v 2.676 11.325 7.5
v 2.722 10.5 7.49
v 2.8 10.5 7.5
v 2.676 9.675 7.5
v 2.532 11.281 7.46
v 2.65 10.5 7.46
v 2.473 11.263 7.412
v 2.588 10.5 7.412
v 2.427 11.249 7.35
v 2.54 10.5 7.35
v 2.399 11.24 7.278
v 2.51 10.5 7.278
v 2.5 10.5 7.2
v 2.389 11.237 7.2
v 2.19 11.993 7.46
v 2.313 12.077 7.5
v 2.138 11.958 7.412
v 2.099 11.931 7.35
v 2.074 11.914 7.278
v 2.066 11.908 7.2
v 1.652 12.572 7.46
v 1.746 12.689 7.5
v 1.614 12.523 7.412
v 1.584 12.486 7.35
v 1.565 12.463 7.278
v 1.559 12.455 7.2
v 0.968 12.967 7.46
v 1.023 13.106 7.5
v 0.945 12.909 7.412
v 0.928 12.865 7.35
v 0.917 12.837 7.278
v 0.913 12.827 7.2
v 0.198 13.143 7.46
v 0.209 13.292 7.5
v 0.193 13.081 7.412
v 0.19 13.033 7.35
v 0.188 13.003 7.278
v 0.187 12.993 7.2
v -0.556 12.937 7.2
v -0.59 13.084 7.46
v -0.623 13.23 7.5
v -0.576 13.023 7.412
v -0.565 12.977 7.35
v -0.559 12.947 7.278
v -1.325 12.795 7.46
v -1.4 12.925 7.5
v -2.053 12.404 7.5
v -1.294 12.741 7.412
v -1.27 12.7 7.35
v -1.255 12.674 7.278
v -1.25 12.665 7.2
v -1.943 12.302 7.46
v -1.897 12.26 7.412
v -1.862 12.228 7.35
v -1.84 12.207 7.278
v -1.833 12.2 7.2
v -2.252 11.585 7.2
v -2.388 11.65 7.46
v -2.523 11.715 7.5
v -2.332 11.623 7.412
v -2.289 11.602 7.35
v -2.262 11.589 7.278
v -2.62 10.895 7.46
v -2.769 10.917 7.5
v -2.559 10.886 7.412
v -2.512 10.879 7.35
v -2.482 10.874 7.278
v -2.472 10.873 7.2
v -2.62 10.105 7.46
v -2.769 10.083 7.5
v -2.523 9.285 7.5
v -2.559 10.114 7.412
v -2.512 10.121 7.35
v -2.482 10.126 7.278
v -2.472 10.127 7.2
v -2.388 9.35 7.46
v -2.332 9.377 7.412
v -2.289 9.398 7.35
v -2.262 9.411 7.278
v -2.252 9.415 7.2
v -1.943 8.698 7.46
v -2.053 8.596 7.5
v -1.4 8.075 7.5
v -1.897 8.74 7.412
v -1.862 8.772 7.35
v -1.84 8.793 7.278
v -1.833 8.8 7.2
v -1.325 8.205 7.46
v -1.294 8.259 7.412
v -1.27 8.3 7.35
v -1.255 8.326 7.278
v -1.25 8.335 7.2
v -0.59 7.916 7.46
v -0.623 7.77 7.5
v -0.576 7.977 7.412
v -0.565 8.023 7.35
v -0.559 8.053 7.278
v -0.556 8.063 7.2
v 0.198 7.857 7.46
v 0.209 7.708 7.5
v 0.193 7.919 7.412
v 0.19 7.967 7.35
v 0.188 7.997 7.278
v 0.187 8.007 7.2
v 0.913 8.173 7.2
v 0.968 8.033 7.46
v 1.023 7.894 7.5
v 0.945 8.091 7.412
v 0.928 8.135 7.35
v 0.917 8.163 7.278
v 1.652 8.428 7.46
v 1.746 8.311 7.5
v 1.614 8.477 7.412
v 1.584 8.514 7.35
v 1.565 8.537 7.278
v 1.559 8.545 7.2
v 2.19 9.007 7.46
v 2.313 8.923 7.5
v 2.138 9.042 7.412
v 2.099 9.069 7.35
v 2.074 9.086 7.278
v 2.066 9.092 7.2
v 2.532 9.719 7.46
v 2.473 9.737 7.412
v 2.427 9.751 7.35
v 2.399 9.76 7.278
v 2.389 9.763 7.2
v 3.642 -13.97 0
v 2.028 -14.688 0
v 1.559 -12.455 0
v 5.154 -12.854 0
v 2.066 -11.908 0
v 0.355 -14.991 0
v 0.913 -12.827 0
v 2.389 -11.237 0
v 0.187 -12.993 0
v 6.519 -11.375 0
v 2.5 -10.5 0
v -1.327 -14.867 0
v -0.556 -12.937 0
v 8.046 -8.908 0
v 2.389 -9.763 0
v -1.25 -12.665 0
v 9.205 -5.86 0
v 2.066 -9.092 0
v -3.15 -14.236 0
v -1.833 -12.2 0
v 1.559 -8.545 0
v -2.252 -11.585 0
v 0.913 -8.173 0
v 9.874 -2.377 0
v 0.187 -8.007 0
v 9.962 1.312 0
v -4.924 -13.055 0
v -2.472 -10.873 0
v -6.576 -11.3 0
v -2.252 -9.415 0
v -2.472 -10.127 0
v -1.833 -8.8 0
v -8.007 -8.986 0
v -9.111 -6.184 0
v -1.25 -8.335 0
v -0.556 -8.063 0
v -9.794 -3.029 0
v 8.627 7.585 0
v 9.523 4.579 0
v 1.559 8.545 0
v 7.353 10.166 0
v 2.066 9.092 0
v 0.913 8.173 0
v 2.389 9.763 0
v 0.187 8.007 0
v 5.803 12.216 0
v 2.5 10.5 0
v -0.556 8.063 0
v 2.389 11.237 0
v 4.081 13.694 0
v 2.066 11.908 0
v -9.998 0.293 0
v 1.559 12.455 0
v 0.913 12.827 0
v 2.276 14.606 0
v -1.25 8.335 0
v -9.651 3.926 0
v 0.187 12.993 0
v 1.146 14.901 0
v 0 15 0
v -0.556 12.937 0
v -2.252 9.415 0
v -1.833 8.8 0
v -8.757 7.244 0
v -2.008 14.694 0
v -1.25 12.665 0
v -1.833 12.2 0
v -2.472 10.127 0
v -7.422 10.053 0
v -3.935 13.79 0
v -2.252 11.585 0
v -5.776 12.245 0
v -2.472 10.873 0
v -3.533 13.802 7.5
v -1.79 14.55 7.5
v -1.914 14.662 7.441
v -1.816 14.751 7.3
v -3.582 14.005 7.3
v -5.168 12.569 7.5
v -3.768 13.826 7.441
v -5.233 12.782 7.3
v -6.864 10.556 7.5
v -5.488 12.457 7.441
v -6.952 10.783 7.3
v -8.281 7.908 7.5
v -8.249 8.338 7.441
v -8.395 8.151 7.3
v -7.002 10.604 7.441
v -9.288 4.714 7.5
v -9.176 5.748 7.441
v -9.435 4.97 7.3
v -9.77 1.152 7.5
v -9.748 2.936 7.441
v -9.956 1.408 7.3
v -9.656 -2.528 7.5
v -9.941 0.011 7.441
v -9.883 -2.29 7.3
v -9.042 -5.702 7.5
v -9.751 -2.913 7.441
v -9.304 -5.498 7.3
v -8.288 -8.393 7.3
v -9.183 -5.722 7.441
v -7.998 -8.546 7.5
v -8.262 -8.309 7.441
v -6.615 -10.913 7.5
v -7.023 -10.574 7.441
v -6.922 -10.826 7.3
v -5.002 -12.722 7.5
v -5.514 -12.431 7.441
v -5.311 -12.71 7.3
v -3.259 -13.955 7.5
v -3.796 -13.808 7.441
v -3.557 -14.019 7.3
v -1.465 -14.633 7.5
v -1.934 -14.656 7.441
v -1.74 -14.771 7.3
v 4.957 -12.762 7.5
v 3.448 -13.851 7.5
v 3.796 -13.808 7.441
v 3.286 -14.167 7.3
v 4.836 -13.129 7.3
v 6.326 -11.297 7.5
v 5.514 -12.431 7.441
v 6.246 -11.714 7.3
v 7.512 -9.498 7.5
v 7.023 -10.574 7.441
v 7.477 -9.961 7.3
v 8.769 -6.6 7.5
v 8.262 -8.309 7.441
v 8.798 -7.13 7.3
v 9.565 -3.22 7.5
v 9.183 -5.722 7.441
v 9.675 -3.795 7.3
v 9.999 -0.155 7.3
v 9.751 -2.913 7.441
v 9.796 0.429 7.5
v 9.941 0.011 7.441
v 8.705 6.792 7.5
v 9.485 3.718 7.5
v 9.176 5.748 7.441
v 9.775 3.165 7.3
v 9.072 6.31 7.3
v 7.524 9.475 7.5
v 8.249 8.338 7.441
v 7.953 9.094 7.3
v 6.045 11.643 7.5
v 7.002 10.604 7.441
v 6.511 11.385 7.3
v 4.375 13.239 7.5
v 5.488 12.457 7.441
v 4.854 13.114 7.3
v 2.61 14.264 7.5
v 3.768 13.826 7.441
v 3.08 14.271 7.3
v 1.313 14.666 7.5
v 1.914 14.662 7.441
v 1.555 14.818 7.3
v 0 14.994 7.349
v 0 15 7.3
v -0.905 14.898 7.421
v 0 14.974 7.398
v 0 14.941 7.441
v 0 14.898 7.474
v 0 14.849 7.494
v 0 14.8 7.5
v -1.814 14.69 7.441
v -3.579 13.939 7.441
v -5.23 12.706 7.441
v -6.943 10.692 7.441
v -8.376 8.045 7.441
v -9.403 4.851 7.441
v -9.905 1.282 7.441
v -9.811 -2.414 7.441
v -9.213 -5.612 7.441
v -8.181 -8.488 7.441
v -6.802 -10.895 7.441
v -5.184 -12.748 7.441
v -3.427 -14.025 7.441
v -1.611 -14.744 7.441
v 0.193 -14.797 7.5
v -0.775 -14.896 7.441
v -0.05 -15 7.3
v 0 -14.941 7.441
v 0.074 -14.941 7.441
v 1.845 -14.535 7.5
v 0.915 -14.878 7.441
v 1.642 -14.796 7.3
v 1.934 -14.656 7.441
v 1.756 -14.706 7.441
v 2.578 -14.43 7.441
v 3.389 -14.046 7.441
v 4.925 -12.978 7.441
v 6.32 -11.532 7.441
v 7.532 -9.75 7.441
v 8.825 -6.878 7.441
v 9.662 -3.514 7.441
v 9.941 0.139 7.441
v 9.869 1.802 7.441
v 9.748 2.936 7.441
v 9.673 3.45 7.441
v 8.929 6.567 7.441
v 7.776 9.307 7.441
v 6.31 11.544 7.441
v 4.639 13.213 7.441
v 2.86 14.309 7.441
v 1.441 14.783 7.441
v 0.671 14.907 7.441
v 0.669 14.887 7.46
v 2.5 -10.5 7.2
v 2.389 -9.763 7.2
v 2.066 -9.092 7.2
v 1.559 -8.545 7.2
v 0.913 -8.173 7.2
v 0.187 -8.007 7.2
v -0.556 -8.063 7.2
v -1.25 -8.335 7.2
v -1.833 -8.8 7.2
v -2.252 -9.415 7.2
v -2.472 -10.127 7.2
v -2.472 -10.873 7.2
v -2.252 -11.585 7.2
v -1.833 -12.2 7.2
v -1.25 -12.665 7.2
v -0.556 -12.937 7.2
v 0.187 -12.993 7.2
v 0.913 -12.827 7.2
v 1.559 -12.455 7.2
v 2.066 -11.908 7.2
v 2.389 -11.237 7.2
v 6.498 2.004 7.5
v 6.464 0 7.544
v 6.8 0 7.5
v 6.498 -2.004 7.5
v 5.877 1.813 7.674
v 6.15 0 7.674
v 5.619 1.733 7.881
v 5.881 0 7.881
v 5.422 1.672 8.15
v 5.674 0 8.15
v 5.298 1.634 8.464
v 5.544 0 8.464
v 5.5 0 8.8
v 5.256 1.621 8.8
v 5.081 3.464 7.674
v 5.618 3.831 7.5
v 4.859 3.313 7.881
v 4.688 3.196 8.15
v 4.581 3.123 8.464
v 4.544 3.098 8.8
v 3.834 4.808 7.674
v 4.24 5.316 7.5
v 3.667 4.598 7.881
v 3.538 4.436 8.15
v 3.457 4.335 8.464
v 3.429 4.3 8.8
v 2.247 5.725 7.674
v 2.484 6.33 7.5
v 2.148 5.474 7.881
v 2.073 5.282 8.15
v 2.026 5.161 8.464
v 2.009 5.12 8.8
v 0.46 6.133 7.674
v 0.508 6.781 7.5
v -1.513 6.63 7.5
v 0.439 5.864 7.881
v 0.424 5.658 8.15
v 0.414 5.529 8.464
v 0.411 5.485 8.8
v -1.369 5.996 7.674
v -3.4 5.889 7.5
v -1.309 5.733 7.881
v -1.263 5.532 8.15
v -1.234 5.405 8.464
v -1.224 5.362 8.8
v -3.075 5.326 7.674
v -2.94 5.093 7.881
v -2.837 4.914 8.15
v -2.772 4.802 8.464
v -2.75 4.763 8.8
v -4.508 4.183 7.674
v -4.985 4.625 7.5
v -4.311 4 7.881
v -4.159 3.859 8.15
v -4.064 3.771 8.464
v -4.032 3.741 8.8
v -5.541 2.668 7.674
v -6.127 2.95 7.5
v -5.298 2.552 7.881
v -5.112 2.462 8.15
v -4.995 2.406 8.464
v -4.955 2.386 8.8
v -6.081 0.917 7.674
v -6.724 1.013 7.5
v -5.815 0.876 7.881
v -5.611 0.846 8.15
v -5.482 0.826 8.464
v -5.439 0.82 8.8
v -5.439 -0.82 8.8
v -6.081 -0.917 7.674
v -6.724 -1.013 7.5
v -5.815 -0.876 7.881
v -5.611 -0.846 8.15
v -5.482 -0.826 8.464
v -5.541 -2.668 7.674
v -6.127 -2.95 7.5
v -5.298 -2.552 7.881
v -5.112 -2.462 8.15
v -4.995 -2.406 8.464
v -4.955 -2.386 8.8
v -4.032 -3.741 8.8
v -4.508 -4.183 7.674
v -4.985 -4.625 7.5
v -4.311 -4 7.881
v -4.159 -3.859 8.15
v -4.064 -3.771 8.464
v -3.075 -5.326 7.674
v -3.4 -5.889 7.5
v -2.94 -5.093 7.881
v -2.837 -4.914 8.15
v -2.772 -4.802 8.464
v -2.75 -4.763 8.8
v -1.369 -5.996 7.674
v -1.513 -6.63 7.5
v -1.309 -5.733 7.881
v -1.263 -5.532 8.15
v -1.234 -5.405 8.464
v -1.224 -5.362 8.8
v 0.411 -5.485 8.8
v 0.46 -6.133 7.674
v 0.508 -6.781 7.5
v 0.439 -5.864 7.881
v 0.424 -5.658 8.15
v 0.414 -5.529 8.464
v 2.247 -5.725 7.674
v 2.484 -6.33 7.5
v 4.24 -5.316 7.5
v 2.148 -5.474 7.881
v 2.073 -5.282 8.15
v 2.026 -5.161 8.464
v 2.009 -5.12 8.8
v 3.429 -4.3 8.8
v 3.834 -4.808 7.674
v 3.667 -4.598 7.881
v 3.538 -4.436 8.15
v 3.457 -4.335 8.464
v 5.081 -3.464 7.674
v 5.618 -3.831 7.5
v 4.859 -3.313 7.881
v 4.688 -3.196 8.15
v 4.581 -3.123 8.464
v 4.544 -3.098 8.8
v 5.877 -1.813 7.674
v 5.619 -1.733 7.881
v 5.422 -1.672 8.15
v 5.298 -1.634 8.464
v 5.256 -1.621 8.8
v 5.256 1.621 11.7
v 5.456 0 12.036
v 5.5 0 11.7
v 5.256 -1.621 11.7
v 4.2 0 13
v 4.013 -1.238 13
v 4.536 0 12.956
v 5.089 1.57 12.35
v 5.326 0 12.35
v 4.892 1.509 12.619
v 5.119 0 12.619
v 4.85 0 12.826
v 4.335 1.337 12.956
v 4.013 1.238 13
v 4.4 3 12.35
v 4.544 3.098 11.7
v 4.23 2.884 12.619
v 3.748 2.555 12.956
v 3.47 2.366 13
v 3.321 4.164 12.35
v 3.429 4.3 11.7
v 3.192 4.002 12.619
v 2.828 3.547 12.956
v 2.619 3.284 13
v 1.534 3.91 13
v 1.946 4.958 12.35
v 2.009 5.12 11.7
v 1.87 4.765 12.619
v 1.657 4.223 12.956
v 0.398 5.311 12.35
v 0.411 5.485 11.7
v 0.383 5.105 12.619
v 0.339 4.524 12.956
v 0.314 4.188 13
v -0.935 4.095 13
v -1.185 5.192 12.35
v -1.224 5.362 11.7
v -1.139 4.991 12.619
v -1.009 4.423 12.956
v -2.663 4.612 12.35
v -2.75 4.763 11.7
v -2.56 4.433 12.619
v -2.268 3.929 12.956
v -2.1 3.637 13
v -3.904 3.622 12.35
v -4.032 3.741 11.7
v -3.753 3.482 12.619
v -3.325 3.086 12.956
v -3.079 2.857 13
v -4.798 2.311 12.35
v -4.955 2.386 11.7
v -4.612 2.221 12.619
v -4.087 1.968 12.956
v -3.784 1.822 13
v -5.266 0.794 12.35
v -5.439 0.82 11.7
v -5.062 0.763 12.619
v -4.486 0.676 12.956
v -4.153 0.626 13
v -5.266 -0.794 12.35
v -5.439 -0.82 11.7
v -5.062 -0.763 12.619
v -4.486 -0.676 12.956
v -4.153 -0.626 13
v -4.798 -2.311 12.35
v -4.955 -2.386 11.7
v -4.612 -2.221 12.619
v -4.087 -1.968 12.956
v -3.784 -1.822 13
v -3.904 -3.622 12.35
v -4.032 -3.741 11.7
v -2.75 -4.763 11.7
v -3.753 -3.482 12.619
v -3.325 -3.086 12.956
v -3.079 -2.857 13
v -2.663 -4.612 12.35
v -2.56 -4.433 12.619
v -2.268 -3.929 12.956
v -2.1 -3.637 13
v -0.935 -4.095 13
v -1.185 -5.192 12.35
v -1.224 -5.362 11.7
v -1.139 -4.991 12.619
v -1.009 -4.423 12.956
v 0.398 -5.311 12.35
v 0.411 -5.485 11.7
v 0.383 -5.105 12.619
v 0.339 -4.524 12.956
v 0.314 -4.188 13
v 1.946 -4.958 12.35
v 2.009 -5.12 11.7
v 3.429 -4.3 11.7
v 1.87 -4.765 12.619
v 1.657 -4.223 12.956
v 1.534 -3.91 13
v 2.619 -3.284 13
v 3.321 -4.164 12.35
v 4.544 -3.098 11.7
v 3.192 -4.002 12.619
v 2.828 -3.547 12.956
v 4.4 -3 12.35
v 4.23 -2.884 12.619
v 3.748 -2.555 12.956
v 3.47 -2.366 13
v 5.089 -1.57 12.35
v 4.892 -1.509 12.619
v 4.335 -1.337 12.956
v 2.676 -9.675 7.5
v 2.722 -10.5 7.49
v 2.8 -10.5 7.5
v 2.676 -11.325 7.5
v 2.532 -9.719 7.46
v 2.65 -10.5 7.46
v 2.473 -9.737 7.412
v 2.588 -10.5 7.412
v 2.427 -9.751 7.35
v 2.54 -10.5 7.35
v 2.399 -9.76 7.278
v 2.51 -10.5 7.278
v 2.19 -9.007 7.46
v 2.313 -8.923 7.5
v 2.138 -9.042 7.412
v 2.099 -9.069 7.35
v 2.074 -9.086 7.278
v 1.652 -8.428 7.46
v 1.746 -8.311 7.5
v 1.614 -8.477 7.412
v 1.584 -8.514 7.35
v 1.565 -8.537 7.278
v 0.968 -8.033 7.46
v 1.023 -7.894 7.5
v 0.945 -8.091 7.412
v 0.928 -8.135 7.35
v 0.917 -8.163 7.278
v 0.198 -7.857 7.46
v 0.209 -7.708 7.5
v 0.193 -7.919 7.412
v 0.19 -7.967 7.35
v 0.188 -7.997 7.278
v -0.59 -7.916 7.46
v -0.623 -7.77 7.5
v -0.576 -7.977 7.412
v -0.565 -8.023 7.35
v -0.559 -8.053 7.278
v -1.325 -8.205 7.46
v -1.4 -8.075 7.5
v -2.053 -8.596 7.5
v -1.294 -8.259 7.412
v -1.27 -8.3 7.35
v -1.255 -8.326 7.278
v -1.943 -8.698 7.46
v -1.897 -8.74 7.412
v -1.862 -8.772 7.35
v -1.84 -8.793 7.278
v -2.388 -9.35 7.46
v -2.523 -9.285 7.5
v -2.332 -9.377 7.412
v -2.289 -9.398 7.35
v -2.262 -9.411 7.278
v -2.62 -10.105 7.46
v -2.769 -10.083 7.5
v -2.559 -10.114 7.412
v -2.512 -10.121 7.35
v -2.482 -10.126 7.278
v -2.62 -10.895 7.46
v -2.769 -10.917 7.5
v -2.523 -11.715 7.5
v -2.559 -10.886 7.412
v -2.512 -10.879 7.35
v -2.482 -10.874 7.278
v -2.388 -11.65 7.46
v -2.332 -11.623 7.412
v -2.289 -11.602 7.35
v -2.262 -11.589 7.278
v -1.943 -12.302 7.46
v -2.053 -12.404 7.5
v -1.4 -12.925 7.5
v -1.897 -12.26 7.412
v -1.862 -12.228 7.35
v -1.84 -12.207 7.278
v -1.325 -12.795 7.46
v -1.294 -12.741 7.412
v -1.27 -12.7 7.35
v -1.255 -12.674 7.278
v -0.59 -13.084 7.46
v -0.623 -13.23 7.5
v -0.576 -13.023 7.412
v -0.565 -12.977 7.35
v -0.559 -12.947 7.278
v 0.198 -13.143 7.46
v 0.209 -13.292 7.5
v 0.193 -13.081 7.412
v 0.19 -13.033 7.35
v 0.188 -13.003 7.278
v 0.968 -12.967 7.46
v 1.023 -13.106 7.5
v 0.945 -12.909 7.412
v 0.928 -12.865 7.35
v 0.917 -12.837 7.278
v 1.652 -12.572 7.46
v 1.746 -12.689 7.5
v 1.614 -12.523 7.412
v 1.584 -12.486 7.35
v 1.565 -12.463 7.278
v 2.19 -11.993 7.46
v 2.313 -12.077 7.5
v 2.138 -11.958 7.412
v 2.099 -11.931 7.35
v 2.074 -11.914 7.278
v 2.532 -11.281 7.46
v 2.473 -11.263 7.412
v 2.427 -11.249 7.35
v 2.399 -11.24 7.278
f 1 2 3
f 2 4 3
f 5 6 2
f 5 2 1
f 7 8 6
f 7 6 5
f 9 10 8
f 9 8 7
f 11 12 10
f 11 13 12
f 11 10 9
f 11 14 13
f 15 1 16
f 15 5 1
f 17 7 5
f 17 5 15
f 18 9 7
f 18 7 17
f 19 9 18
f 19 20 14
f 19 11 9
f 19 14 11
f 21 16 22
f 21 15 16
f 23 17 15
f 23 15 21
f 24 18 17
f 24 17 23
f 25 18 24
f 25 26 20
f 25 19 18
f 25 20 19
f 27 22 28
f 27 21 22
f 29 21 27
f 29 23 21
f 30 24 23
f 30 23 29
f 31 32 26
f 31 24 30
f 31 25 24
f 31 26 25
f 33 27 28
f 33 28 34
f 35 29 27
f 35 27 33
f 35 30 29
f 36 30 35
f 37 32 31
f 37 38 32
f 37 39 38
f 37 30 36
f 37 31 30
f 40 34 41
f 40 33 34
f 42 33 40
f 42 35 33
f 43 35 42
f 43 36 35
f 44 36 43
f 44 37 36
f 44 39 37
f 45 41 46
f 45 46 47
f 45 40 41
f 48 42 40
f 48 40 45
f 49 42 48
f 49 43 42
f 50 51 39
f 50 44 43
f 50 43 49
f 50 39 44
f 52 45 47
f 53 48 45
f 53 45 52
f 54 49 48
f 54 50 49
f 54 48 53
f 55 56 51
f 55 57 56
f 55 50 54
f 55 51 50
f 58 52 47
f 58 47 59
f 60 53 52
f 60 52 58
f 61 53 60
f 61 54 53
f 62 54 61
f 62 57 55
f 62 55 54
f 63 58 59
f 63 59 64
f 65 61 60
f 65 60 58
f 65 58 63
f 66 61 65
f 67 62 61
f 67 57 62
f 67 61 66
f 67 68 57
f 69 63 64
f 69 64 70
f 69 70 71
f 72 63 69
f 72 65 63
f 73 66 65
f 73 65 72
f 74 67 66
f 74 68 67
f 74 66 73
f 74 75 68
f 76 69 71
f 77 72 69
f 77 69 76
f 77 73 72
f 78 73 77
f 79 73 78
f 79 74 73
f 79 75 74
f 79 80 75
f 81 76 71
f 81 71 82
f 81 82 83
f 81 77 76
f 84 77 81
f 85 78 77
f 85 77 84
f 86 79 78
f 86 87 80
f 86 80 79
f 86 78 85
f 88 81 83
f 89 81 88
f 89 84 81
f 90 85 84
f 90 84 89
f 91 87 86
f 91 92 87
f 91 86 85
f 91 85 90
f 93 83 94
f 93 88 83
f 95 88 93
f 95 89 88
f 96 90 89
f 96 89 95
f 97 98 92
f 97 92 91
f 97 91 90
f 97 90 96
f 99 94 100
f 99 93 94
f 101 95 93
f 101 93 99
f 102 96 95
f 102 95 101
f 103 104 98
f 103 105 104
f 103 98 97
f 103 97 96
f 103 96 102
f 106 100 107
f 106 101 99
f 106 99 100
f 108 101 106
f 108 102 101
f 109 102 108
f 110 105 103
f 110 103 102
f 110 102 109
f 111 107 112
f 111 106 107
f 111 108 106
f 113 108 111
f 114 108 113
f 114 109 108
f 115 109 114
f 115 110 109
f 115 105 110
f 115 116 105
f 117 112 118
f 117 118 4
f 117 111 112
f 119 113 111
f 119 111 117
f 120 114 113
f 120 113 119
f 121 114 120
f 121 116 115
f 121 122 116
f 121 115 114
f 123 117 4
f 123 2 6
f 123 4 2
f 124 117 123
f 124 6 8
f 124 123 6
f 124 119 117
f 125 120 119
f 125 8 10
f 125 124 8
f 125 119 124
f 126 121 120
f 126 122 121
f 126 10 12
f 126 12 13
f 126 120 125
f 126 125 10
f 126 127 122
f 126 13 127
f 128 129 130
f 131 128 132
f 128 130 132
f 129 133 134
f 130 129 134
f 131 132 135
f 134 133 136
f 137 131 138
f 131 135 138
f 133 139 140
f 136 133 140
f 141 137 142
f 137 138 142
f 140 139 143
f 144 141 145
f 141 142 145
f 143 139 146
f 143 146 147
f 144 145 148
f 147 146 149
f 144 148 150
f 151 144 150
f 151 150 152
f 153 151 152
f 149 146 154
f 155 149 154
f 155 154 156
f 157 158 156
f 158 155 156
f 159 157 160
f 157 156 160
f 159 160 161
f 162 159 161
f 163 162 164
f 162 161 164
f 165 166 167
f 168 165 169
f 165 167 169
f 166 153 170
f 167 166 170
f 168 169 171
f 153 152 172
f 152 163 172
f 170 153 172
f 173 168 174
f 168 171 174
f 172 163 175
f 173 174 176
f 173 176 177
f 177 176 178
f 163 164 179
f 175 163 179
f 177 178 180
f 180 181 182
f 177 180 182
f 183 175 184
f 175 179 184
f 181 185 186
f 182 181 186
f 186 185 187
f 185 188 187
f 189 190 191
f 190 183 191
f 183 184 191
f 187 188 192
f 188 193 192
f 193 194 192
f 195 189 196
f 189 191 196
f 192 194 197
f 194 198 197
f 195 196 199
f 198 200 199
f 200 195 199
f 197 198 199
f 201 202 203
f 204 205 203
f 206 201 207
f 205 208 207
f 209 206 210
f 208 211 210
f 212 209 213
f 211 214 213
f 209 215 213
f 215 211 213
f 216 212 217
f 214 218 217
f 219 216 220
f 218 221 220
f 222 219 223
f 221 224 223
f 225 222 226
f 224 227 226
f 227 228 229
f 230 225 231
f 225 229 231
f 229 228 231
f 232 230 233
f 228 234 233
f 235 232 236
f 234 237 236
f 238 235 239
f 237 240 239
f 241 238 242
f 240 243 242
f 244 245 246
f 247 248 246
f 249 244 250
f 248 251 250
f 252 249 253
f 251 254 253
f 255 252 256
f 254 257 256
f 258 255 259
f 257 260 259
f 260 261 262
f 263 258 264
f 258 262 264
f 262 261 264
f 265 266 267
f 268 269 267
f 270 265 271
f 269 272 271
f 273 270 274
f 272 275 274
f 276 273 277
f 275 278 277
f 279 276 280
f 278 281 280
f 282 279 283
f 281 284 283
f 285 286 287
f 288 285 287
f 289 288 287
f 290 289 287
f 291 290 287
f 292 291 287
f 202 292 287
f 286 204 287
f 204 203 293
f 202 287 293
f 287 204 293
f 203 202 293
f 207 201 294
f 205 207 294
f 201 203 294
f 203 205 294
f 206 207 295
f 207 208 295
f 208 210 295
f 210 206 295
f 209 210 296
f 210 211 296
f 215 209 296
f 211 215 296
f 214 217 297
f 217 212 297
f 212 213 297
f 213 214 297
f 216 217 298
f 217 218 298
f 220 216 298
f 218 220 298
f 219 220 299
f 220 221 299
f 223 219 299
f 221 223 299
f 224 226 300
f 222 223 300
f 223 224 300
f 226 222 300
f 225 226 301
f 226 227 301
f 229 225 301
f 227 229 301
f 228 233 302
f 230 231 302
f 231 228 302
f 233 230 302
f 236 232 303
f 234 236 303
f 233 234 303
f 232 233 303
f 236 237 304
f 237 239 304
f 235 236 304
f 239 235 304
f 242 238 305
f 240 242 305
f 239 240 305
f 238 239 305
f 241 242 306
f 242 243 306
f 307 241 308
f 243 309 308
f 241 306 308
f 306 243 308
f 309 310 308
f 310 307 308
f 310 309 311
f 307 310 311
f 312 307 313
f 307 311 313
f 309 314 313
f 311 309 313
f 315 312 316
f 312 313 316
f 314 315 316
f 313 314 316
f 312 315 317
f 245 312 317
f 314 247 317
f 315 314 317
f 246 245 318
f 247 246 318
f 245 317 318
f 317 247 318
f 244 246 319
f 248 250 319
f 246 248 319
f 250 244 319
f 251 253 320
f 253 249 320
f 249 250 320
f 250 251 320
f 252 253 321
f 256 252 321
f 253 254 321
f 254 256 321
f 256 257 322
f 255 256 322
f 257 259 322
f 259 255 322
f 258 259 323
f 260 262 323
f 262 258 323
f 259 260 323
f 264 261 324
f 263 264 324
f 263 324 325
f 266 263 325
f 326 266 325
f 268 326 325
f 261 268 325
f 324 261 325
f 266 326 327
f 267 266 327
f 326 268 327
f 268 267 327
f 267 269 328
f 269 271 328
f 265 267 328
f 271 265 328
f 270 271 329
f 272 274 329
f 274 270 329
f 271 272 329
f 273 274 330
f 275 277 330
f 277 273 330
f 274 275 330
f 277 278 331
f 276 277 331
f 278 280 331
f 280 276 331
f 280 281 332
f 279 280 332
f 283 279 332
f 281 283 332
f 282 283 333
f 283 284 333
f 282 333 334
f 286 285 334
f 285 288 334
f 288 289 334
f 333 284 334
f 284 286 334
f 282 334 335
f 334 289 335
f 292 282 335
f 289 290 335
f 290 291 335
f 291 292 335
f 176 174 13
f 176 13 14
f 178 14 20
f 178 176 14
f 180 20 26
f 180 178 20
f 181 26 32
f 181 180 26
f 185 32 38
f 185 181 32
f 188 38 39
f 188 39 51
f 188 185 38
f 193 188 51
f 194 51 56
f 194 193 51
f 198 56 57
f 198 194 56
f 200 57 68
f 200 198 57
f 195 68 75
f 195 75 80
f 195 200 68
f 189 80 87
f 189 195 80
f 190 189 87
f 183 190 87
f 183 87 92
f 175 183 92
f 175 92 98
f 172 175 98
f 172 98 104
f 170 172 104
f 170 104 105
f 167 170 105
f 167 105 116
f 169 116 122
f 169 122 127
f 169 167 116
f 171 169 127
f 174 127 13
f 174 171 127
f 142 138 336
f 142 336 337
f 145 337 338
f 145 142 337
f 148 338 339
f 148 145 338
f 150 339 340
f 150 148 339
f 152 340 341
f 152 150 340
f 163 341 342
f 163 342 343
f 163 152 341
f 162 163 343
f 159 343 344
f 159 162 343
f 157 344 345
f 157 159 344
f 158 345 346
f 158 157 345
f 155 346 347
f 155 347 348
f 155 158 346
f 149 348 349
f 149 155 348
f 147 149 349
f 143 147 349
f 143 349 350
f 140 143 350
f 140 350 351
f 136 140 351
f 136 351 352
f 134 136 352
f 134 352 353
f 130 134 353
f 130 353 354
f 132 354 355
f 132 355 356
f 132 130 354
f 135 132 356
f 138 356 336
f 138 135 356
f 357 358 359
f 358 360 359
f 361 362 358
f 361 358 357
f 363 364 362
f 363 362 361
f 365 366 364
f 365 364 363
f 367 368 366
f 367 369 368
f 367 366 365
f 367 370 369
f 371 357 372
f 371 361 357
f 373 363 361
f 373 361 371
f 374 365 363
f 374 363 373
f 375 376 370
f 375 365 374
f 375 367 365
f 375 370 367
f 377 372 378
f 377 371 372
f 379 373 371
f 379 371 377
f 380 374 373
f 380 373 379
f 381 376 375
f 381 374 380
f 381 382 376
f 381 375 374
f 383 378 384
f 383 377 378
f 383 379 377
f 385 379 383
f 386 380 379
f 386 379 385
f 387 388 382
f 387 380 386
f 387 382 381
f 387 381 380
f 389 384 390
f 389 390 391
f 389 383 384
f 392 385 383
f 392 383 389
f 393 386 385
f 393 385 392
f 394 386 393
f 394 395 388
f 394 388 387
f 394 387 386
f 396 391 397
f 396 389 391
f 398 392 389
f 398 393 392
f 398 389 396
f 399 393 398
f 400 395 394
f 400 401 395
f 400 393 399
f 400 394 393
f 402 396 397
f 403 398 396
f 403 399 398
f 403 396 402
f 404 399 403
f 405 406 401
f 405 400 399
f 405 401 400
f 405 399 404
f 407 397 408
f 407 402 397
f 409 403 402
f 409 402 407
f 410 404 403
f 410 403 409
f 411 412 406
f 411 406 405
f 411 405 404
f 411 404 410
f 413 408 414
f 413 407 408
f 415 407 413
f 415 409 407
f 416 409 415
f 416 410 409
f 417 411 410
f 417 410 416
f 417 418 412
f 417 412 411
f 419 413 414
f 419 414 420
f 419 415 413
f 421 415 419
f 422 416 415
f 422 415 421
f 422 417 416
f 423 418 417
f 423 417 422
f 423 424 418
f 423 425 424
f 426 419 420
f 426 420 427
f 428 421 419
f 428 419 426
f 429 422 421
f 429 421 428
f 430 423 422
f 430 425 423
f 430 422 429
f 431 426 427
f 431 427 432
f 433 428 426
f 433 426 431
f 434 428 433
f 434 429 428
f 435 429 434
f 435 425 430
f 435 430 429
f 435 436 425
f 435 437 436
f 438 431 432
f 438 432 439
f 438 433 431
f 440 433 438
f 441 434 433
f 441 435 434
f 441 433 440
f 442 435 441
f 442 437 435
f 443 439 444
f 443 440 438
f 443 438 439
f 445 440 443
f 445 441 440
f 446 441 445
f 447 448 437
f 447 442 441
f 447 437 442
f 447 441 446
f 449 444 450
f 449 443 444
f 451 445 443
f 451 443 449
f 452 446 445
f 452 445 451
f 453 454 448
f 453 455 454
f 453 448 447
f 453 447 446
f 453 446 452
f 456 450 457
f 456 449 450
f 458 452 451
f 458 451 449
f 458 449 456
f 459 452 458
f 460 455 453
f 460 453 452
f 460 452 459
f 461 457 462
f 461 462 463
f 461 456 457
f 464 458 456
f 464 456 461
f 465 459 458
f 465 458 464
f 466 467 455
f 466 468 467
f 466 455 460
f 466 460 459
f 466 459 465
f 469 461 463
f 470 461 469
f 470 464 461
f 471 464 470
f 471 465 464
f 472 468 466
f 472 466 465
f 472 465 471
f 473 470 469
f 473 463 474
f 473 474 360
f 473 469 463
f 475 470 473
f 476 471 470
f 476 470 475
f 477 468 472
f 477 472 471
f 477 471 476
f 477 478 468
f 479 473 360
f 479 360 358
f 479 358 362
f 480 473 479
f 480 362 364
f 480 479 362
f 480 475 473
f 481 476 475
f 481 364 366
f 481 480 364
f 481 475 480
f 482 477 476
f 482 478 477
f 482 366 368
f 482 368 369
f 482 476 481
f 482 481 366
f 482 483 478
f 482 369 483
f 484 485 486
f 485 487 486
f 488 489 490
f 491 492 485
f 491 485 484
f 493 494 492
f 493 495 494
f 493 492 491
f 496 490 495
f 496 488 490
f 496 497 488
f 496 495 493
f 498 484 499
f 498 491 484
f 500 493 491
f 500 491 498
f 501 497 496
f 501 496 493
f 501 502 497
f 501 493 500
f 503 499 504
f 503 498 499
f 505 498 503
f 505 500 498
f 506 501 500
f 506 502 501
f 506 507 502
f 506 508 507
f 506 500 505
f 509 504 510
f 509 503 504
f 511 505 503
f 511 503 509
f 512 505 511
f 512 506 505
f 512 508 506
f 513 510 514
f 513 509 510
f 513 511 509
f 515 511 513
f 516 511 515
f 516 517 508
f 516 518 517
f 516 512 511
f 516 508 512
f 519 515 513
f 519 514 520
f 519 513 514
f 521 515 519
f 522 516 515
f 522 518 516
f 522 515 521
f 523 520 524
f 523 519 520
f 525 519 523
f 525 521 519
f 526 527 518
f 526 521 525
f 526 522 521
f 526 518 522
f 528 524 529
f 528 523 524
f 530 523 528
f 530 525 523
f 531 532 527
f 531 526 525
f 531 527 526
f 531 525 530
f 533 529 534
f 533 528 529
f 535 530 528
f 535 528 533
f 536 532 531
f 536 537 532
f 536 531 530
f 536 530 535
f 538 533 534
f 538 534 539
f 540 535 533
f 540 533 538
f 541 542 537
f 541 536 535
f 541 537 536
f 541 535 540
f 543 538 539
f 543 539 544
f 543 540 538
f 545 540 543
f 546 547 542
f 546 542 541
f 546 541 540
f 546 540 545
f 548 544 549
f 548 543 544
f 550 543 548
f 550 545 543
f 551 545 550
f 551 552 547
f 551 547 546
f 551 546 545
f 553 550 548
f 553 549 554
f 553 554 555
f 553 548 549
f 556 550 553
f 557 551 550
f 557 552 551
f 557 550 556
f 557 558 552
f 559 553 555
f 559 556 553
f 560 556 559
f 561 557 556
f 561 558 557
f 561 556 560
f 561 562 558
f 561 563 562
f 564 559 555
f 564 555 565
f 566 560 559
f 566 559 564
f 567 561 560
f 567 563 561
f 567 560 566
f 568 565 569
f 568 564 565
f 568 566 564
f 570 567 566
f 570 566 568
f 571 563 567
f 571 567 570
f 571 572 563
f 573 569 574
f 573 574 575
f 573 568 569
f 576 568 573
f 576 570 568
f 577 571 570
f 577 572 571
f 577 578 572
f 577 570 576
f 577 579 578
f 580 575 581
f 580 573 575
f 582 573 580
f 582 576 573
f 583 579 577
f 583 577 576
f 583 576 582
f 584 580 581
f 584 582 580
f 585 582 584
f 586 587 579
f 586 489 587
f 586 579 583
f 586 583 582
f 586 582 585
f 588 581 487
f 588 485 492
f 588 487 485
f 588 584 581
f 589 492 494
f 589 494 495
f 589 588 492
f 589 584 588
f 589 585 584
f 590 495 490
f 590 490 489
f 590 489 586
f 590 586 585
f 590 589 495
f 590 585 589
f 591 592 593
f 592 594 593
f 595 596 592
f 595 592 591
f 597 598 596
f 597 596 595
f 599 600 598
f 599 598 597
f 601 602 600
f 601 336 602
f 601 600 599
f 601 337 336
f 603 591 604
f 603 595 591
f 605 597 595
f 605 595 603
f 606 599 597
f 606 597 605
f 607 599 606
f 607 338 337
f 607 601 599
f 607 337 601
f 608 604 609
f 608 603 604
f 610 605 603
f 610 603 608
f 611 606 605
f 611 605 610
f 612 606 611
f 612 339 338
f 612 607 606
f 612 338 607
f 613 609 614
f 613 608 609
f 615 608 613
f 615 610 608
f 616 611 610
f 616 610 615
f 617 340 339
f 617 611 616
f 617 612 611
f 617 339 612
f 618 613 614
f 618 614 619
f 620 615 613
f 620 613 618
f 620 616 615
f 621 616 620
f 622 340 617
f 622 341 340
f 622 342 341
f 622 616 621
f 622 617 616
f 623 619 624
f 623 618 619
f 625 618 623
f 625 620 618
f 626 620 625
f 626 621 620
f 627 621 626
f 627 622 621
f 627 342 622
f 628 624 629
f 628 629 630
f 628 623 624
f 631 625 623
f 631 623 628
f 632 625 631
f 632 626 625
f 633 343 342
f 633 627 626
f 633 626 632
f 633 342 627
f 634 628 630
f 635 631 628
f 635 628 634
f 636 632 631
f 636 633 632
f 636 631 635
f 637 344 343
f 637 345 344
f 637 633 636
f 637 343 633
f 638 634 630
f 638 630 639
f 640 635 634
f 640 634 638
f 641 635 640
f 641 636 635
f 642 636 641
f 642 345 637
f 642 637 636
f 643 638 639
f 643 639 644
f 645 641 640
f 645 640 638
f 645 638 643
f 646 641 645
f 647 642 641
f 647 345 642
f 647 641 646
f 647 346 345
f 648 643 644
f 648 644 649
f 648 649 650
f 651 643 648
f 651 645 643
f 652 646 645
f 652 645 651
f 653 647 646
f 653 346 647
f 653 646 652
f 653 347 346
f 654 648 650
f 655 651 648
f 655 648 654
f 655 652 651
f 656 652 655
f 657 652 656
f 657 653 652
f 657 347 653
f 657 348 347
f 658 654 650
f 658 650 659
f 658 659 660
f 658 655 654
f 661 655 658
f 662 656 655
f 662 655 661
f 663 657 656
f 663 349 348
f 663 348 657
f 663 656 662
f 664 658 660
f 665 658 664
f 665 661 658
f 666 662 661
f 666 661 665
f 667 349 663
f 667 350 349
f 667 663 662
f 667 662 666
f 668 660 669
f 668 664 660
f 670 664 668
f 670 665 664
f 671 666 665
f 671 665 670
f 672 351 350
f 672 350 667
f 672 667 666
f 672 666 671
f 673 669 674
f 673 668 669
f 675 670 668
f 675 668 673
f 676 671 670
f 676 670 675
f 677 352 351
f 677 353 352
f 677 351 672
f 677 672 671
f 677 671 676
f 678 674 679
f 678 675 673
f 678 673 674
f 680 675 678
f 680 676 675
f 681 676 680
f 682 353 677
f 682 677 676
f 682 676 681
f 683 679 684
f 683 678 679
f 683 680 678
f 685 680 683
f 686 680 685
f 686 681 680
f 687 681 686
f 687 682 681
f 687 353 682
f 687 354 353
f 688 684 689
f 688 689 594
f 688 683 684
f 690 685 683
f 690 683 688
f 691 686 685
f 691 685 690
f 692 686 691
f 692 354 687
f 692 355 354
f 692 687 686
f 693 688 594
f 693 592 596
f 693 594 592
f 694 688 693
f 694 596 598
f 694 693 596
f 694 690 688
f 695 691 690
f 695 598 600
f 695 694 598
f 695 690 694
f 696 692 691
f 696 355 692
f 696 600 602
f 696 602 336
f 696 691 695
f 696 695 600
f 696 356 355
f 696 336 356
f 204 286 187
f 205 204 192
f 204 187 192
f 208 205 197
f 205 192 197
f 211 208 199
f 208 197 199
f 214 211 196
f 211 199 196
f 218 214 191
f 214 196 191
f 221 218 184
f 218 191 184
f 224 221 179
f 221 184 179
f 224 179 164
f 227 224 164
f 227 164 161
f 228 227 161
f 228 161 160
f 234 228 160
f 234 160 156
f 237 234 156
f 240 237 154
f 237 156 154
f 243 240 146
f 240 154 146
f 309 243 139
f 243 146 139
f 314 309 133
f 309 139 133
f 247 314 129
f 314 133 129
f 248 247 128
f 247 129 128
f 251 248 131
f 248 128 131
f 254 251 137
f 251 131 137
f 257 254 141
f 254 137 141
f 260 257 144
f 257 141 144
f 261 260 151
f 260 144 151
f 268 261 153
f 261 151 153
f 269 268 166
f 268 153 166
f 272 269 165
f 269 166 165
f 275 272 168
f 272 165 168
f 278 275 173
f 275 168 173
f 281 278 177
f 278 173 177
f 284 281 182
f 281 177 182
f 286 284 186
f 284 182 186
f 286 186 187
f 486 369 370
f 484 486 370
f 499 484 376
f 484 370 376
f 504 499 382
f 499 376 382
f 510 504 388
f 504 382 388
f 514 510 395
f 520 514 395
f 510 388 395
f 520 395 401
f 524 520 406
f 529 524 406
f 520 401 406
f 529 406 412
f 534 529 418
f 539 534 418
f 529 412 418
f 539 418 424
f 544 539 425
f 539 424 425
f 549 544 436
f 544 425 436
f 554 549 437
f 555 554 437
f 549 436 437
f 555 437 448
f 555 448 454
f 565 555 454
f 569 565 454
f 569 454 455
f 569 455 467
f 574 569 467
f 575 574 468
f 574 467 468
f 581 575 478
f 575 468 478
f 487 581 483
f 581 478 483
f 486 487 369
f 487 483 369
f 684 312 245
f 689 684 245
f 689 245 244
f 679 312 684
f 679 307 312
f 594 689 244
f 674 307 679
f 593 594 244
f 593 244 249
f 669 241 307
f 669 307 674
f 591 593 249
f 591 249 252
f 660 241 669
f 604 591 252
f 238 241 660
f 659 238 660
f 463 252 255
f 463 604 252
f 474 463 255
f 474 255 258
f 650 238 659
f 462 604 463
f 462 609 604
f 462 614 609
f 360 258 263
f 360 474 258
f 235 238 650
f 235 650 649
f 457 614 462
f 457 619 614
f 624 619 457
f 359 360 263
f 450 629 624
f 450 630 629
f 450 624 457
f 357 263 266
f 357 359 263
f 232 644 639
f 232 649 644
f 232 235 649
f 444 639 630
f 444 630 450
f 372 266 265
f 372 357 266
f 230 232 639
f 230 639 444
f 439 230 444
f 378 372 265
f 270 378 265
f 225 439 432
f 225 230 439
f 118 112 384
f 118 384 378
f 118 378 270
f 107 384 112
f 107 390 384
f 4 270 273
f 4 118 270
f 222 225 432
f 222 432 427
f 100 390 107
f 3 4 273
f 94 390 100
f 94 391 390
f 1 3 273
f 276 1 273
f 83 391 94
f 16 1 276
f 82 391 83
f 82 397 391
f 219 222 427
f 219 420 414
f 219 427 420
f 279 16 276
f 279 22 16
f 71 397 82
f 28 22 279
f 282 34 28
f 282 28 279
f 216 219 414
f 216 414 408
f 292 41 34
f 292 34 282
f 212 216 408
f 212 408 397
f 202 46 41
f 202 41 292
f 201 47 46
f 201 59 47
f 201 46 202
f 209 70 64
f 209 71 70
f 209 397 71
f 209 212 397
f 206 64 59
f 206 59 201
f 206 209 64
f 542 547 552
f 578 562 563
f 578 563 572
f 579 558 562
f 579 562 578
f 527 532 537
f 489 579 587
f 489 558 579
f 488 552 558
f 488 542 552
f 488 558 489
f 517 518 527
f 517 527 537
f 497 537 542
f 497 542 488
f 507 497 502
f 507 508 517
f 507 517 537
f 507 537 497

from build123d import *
from OCP.BRepFilletAPI import BRepFilletAPI_MakeFillet

# Parameters (mm, degrees)
ESQUISSE1_RX       = 15
ESQUISSE1_RY       = 10
ESQUISSE1_R        = 2.5
BOSS_EXTRU_1_DEPTH = 7.5
ESQUISSE3_R        = 5.5
BOSS_EXTRU_3_DEPTH = 5.5
CONG_2_R1          = 0.3
CONG_2_R2          = 1.3
CONG_2_R3          = 0.2


with BuildPart() as part:
    # Esquisse1 → Boss.-Extru.1 (new body)
    with BuildSketch(Plane.XY):
        with Locations(Location((0, 0), (0, 0, 90))):
            Ellipse(ESQUISSE1_RX, ESQUISSE1_RY)
        with Locations((0, 10.5)):
            Circle(ESQUISSE1_R, mode=Mode.SUBTRACT)
        with Locations((0, -10.5)):
            Circle(ESQUISSE1_R, mode=Mode.SUBTRACT)
    extrude(amount=BOSS_EXTRU_1_DEPTH)

    # Esquisse3 → Boss.-Extru.3 (add)
    with BuildSketch(Plane.XY.offset(7.5)):
        Circle(ESQUISSE3_R)
    extrude(amount=BOSS_EXTRU_3_DEPTH)

    # Congé2: one fillet with a radius per group of edges: ONE call of the kernel's fillet builder (fillet() takes one radius for all edges)
    cong_2_edges_1 = [part.edges().sort_by_distance(p)[0] for p in [
        (-2.5, 10.5, 7.5),
        (-2.5, -10.5, 7.5),
    ]]
    cong_2_edges_2 = [part.edges().sort_by_distance(p)[0] for p in [
        (-5.5, 0, 13),
        (-5.5, 0, 7.5),
    ]]
    cong_2_edges_3 = [part.edges().sort_by_distance(p)[0] for p in [
        (0.0106478, -14.999991497, 7.5),
    ]]
    cong_2 = BRepFilletAPI_MakeFillet(part.part.solid().wrapped)
    for e in cong_2_edges_1:
        cong_2.Add(CONG_2_R1, e.wrapped)
    for e in cong_2_edges_2:
        cong_2.Add(CONG_2_R2, e.wrapped)
    for e in cong_2_edges_3:
        cong_2.Add(CONG_2_R3, e.wrapped)
    add(Compound.cast(cong_2.Shape()), mode=Mode.REPLACE)


solid = part.part
